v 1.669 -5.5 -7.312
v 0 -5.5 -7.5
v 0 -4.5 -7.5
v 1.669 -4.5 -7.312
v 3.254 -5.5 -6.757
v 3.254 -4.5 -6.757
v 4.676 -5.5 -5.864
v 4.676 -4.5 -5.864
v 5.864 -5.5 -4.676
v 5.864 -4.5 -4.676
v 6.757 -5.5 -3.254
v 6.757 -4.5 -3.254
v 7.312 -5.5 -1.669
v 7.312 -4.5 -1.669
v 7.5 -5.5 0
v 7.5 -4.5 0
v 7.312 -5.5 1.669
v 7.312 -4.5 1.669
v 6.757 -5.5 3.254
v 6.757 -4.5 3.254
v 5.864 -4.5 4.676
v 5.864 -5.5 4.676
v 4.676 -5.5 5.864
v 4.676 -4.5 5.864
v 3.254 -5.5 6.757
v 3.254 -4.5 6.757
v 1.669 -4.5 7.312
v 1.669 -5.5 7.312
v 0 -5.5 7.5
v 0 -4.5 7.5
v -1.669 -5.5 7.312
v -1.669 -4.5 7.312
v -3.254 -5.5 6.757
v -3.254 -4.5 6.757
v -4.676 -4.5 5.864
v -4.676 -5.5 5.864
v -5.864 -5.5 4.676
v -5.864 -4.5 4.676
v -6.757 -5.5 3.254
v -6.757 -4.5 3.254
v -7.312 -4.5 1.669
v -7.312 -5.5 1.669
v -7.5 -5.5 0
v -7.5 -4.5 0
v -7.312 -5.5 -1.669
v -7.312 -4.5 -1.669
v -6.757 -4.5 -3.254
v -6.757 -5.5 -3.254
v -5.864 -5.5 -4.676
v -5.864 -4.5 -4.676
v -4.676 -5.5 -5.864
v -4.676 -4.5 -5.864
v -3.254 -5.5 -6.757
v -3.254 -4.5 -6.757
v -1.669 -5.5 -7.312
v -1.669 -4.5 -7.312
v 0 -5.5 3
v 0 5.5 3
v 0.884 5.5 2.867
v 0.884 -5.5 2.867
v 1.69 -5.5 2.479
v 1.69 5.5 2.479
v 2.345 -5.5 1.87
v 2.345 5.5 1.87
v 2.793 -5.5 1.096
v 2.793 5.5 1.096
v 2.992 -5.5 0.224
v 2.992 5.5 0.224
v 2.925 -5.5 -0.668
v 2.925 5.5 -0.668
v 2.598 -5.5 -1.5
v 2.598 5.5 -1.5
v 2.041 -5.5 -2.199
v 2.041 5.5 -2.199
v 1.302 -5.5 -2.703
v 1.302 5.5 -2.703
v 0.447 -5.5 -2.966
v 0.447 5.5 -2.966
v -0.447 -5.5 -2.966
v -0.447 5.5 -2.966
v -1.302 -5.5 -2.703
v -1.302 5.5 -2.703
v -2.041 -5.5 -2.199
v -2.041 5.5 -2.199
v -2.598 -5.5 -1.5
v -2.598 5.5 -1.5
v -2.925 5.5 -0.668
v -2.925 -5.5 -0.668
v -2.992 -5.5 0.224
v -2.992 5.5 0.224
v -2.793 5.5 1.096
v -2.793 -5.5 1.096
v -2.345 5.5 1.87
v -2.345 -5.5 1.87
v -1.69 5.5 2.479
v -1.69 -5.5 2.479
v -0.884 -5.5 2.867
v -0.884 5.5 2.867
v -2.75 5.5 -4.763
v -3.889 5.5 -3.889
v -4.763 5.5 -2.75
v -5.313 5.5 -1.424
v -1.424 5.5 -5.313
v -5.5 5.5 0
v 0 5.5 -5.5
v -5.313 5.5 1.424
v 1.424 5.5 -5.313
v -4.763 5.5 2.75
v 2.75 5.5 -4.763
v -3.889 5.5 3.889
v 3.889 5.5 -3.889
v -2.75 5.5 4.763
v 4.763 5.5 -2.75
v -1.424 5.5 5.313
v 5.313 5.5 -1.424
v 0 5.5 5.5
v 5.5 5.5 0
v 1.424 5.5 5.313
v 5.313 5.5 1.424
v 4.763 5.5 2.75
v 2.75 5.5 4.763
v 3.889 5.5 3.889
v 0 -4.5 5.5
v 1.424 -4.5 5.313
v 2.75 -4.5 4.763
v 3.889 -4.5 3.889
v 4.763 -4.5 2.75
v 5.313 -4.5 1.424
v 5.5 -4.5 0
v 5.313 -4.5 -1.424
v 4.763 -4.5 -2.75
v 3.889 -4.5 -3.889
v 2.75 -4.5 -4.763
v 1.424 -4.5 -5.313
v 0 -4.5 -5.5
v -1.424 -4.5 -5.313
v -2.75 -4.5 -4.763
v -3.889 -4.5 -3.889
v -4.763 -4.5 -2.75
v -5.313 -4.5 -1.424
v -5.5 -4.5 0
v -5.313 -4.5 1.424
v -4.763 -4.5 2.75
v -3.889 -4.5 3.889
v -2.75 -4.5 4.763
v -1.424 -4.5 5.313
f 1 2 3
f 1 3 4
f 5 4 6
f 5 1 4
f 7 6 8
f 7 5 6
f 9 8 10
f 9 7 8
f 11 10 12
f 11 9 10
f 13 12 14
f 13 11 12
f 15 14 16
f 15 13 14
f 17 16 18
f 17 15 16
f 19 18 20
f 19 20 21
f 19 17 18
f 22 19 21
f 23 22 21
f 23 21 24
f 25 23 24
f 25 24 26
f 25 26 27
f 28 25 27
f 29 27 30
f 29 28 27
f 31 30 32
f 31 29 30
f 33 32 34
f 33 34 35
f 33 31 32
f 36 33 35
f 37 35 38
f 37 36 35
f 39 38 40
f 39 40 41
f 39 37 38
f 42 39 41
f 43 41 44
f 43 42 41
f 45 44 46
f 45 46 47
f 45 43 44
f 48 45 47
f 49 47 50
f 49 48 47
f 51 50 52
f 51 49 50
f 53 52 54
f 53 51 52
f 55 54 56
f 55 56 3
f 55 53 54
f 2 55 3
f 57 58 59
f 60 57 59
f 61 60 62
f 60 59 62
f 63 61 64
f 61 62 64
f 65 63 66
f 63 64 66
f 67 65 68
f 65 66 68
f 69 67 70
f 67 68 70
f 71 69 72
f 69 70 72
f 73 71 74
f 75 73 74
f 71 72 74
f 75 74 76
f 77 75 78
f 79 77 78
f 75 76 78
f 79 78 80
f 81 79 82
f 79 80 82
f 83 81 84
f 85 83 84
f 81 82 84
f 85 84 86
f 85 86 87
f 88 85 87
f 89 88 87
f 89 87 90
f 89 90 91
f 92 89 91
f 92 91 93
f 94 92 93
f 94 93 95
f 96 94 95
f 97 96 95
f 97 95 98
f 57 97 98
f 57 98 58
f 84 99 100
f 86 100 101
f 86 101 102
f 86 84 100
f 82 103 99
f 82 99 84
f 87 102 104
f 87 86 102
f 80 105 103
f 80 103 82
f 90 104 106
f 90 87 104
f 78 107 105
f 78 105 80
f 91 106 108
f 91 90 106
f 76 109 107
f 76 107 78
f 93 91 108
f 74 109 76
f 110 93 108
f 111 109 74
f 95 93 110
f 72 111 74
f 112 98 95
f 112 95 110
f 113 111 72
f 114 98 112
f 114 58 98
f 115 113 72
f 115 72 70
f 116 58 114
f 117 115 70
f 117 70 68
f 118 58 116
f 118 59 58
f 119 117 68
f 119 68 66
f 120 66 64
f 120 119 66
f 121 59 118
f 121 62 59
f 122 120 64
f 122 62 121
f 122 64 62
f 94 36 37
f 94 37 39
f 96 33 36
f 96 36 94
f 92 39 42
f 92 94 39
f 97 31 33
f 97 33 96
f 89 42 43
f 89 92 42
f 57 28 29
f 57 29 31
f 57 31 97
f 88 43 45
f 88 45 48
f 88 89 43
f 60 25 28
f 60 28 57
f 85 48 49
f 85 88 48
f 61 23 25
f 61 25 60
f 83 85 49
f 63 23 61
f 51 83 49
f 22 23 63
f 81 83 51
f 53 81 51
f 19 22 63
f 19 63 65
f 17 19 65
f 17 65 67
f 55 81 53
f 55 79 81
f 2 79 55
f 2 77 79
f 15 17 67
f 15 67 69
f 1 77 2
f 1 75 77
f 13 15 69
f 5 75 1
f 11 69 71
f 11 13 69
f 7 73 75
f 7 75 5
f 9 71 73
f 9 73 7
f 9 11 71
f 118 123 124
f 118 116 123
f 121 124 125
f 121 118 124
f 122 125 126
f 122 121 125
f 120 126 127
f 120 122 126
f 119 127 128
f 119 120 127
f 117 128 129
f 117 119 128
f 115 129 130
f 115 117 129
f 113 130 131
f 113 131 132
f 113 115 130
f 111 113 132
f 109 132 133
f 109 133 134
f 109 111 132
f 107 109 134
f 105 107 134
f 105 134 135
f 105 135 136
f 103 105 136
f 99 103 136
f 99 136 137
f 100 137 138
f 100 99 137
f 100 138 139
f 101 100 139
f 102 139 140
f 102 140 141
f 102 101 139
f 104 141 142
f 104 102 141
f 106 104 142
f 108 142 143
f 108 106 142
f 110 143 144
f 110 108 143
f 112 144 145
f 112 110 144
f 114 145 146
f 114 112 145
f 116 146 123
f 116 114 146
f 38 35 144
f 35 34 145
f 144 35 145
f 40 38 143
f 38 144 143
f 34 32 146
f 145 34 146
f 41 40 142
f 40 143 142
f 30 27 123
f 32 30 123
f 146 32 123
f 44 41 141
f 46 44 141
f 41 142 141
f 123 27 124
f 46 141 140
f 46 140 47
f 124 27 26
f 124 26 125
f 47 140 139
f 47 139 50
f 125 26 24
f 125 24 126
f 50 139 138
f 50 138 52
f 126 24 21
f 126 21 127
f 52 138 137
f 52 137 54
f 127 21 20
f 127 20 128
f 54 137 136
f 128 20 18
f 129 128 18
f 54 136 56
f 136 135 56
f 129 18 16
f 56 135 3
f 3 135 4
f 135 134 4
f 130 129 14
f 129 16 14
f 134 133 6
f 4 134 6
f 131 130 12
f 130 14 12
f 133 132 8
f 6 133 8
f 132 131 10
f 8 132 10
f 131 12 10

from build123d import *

# Parameters (mm, degrees)
SKETCH1_R           = 5.5
BOSS_EXTRUDE1_DEPTH = 5.5
SKETCH2_R           = 7.5
BOSS_EXTRUDE2_DEPTH = 1
SKETCH3_R           = 3
CUT_EXTRUDE1_DEPTH  = 16.28070679


with BuildPart() as part:
    # Sketch1 → Boss-Extrude1 (new, symmetric)
    with BuildSketch(Plane(origin=(0, 0, 0), x_dir=(1, 0, 0), z_dir=(0, 1, 0))):
        with Locations(Location((0, 0, 0), (0, 0, 270))):
            Circle(SKETCH1_R)
    extrude(amount=BOSS_EXTRUDE1_DEPTH, both=True)

    # Sketch2 → Boss-Extrude2 (add)
    with BuildSketch(Plane.XZ.offset(5.5)):
        with Locations(Location((0, 0, 0), (0, 0, 270))):
            Circle(SKETCH2_R)
    extrude(amount=-BOSS_EXTRUDE2_DEPTH)

    # Sketch3 → Cut-Extrude1 (cut, through all)
    with BuildSketch(Plane(origin=(0, 5.5, 0), x_dir=(1, 0, 0), z_dir=(0, 1, 0))):
        with Locations(Location((0, 0, 0), (0, 0, 270))):
            Circle(SKETCH3_R)
    extrude(amount=-CUT_EXTRUDE1_DEPTH, mode=Mode.SUBTRACT)


solid = part.part
